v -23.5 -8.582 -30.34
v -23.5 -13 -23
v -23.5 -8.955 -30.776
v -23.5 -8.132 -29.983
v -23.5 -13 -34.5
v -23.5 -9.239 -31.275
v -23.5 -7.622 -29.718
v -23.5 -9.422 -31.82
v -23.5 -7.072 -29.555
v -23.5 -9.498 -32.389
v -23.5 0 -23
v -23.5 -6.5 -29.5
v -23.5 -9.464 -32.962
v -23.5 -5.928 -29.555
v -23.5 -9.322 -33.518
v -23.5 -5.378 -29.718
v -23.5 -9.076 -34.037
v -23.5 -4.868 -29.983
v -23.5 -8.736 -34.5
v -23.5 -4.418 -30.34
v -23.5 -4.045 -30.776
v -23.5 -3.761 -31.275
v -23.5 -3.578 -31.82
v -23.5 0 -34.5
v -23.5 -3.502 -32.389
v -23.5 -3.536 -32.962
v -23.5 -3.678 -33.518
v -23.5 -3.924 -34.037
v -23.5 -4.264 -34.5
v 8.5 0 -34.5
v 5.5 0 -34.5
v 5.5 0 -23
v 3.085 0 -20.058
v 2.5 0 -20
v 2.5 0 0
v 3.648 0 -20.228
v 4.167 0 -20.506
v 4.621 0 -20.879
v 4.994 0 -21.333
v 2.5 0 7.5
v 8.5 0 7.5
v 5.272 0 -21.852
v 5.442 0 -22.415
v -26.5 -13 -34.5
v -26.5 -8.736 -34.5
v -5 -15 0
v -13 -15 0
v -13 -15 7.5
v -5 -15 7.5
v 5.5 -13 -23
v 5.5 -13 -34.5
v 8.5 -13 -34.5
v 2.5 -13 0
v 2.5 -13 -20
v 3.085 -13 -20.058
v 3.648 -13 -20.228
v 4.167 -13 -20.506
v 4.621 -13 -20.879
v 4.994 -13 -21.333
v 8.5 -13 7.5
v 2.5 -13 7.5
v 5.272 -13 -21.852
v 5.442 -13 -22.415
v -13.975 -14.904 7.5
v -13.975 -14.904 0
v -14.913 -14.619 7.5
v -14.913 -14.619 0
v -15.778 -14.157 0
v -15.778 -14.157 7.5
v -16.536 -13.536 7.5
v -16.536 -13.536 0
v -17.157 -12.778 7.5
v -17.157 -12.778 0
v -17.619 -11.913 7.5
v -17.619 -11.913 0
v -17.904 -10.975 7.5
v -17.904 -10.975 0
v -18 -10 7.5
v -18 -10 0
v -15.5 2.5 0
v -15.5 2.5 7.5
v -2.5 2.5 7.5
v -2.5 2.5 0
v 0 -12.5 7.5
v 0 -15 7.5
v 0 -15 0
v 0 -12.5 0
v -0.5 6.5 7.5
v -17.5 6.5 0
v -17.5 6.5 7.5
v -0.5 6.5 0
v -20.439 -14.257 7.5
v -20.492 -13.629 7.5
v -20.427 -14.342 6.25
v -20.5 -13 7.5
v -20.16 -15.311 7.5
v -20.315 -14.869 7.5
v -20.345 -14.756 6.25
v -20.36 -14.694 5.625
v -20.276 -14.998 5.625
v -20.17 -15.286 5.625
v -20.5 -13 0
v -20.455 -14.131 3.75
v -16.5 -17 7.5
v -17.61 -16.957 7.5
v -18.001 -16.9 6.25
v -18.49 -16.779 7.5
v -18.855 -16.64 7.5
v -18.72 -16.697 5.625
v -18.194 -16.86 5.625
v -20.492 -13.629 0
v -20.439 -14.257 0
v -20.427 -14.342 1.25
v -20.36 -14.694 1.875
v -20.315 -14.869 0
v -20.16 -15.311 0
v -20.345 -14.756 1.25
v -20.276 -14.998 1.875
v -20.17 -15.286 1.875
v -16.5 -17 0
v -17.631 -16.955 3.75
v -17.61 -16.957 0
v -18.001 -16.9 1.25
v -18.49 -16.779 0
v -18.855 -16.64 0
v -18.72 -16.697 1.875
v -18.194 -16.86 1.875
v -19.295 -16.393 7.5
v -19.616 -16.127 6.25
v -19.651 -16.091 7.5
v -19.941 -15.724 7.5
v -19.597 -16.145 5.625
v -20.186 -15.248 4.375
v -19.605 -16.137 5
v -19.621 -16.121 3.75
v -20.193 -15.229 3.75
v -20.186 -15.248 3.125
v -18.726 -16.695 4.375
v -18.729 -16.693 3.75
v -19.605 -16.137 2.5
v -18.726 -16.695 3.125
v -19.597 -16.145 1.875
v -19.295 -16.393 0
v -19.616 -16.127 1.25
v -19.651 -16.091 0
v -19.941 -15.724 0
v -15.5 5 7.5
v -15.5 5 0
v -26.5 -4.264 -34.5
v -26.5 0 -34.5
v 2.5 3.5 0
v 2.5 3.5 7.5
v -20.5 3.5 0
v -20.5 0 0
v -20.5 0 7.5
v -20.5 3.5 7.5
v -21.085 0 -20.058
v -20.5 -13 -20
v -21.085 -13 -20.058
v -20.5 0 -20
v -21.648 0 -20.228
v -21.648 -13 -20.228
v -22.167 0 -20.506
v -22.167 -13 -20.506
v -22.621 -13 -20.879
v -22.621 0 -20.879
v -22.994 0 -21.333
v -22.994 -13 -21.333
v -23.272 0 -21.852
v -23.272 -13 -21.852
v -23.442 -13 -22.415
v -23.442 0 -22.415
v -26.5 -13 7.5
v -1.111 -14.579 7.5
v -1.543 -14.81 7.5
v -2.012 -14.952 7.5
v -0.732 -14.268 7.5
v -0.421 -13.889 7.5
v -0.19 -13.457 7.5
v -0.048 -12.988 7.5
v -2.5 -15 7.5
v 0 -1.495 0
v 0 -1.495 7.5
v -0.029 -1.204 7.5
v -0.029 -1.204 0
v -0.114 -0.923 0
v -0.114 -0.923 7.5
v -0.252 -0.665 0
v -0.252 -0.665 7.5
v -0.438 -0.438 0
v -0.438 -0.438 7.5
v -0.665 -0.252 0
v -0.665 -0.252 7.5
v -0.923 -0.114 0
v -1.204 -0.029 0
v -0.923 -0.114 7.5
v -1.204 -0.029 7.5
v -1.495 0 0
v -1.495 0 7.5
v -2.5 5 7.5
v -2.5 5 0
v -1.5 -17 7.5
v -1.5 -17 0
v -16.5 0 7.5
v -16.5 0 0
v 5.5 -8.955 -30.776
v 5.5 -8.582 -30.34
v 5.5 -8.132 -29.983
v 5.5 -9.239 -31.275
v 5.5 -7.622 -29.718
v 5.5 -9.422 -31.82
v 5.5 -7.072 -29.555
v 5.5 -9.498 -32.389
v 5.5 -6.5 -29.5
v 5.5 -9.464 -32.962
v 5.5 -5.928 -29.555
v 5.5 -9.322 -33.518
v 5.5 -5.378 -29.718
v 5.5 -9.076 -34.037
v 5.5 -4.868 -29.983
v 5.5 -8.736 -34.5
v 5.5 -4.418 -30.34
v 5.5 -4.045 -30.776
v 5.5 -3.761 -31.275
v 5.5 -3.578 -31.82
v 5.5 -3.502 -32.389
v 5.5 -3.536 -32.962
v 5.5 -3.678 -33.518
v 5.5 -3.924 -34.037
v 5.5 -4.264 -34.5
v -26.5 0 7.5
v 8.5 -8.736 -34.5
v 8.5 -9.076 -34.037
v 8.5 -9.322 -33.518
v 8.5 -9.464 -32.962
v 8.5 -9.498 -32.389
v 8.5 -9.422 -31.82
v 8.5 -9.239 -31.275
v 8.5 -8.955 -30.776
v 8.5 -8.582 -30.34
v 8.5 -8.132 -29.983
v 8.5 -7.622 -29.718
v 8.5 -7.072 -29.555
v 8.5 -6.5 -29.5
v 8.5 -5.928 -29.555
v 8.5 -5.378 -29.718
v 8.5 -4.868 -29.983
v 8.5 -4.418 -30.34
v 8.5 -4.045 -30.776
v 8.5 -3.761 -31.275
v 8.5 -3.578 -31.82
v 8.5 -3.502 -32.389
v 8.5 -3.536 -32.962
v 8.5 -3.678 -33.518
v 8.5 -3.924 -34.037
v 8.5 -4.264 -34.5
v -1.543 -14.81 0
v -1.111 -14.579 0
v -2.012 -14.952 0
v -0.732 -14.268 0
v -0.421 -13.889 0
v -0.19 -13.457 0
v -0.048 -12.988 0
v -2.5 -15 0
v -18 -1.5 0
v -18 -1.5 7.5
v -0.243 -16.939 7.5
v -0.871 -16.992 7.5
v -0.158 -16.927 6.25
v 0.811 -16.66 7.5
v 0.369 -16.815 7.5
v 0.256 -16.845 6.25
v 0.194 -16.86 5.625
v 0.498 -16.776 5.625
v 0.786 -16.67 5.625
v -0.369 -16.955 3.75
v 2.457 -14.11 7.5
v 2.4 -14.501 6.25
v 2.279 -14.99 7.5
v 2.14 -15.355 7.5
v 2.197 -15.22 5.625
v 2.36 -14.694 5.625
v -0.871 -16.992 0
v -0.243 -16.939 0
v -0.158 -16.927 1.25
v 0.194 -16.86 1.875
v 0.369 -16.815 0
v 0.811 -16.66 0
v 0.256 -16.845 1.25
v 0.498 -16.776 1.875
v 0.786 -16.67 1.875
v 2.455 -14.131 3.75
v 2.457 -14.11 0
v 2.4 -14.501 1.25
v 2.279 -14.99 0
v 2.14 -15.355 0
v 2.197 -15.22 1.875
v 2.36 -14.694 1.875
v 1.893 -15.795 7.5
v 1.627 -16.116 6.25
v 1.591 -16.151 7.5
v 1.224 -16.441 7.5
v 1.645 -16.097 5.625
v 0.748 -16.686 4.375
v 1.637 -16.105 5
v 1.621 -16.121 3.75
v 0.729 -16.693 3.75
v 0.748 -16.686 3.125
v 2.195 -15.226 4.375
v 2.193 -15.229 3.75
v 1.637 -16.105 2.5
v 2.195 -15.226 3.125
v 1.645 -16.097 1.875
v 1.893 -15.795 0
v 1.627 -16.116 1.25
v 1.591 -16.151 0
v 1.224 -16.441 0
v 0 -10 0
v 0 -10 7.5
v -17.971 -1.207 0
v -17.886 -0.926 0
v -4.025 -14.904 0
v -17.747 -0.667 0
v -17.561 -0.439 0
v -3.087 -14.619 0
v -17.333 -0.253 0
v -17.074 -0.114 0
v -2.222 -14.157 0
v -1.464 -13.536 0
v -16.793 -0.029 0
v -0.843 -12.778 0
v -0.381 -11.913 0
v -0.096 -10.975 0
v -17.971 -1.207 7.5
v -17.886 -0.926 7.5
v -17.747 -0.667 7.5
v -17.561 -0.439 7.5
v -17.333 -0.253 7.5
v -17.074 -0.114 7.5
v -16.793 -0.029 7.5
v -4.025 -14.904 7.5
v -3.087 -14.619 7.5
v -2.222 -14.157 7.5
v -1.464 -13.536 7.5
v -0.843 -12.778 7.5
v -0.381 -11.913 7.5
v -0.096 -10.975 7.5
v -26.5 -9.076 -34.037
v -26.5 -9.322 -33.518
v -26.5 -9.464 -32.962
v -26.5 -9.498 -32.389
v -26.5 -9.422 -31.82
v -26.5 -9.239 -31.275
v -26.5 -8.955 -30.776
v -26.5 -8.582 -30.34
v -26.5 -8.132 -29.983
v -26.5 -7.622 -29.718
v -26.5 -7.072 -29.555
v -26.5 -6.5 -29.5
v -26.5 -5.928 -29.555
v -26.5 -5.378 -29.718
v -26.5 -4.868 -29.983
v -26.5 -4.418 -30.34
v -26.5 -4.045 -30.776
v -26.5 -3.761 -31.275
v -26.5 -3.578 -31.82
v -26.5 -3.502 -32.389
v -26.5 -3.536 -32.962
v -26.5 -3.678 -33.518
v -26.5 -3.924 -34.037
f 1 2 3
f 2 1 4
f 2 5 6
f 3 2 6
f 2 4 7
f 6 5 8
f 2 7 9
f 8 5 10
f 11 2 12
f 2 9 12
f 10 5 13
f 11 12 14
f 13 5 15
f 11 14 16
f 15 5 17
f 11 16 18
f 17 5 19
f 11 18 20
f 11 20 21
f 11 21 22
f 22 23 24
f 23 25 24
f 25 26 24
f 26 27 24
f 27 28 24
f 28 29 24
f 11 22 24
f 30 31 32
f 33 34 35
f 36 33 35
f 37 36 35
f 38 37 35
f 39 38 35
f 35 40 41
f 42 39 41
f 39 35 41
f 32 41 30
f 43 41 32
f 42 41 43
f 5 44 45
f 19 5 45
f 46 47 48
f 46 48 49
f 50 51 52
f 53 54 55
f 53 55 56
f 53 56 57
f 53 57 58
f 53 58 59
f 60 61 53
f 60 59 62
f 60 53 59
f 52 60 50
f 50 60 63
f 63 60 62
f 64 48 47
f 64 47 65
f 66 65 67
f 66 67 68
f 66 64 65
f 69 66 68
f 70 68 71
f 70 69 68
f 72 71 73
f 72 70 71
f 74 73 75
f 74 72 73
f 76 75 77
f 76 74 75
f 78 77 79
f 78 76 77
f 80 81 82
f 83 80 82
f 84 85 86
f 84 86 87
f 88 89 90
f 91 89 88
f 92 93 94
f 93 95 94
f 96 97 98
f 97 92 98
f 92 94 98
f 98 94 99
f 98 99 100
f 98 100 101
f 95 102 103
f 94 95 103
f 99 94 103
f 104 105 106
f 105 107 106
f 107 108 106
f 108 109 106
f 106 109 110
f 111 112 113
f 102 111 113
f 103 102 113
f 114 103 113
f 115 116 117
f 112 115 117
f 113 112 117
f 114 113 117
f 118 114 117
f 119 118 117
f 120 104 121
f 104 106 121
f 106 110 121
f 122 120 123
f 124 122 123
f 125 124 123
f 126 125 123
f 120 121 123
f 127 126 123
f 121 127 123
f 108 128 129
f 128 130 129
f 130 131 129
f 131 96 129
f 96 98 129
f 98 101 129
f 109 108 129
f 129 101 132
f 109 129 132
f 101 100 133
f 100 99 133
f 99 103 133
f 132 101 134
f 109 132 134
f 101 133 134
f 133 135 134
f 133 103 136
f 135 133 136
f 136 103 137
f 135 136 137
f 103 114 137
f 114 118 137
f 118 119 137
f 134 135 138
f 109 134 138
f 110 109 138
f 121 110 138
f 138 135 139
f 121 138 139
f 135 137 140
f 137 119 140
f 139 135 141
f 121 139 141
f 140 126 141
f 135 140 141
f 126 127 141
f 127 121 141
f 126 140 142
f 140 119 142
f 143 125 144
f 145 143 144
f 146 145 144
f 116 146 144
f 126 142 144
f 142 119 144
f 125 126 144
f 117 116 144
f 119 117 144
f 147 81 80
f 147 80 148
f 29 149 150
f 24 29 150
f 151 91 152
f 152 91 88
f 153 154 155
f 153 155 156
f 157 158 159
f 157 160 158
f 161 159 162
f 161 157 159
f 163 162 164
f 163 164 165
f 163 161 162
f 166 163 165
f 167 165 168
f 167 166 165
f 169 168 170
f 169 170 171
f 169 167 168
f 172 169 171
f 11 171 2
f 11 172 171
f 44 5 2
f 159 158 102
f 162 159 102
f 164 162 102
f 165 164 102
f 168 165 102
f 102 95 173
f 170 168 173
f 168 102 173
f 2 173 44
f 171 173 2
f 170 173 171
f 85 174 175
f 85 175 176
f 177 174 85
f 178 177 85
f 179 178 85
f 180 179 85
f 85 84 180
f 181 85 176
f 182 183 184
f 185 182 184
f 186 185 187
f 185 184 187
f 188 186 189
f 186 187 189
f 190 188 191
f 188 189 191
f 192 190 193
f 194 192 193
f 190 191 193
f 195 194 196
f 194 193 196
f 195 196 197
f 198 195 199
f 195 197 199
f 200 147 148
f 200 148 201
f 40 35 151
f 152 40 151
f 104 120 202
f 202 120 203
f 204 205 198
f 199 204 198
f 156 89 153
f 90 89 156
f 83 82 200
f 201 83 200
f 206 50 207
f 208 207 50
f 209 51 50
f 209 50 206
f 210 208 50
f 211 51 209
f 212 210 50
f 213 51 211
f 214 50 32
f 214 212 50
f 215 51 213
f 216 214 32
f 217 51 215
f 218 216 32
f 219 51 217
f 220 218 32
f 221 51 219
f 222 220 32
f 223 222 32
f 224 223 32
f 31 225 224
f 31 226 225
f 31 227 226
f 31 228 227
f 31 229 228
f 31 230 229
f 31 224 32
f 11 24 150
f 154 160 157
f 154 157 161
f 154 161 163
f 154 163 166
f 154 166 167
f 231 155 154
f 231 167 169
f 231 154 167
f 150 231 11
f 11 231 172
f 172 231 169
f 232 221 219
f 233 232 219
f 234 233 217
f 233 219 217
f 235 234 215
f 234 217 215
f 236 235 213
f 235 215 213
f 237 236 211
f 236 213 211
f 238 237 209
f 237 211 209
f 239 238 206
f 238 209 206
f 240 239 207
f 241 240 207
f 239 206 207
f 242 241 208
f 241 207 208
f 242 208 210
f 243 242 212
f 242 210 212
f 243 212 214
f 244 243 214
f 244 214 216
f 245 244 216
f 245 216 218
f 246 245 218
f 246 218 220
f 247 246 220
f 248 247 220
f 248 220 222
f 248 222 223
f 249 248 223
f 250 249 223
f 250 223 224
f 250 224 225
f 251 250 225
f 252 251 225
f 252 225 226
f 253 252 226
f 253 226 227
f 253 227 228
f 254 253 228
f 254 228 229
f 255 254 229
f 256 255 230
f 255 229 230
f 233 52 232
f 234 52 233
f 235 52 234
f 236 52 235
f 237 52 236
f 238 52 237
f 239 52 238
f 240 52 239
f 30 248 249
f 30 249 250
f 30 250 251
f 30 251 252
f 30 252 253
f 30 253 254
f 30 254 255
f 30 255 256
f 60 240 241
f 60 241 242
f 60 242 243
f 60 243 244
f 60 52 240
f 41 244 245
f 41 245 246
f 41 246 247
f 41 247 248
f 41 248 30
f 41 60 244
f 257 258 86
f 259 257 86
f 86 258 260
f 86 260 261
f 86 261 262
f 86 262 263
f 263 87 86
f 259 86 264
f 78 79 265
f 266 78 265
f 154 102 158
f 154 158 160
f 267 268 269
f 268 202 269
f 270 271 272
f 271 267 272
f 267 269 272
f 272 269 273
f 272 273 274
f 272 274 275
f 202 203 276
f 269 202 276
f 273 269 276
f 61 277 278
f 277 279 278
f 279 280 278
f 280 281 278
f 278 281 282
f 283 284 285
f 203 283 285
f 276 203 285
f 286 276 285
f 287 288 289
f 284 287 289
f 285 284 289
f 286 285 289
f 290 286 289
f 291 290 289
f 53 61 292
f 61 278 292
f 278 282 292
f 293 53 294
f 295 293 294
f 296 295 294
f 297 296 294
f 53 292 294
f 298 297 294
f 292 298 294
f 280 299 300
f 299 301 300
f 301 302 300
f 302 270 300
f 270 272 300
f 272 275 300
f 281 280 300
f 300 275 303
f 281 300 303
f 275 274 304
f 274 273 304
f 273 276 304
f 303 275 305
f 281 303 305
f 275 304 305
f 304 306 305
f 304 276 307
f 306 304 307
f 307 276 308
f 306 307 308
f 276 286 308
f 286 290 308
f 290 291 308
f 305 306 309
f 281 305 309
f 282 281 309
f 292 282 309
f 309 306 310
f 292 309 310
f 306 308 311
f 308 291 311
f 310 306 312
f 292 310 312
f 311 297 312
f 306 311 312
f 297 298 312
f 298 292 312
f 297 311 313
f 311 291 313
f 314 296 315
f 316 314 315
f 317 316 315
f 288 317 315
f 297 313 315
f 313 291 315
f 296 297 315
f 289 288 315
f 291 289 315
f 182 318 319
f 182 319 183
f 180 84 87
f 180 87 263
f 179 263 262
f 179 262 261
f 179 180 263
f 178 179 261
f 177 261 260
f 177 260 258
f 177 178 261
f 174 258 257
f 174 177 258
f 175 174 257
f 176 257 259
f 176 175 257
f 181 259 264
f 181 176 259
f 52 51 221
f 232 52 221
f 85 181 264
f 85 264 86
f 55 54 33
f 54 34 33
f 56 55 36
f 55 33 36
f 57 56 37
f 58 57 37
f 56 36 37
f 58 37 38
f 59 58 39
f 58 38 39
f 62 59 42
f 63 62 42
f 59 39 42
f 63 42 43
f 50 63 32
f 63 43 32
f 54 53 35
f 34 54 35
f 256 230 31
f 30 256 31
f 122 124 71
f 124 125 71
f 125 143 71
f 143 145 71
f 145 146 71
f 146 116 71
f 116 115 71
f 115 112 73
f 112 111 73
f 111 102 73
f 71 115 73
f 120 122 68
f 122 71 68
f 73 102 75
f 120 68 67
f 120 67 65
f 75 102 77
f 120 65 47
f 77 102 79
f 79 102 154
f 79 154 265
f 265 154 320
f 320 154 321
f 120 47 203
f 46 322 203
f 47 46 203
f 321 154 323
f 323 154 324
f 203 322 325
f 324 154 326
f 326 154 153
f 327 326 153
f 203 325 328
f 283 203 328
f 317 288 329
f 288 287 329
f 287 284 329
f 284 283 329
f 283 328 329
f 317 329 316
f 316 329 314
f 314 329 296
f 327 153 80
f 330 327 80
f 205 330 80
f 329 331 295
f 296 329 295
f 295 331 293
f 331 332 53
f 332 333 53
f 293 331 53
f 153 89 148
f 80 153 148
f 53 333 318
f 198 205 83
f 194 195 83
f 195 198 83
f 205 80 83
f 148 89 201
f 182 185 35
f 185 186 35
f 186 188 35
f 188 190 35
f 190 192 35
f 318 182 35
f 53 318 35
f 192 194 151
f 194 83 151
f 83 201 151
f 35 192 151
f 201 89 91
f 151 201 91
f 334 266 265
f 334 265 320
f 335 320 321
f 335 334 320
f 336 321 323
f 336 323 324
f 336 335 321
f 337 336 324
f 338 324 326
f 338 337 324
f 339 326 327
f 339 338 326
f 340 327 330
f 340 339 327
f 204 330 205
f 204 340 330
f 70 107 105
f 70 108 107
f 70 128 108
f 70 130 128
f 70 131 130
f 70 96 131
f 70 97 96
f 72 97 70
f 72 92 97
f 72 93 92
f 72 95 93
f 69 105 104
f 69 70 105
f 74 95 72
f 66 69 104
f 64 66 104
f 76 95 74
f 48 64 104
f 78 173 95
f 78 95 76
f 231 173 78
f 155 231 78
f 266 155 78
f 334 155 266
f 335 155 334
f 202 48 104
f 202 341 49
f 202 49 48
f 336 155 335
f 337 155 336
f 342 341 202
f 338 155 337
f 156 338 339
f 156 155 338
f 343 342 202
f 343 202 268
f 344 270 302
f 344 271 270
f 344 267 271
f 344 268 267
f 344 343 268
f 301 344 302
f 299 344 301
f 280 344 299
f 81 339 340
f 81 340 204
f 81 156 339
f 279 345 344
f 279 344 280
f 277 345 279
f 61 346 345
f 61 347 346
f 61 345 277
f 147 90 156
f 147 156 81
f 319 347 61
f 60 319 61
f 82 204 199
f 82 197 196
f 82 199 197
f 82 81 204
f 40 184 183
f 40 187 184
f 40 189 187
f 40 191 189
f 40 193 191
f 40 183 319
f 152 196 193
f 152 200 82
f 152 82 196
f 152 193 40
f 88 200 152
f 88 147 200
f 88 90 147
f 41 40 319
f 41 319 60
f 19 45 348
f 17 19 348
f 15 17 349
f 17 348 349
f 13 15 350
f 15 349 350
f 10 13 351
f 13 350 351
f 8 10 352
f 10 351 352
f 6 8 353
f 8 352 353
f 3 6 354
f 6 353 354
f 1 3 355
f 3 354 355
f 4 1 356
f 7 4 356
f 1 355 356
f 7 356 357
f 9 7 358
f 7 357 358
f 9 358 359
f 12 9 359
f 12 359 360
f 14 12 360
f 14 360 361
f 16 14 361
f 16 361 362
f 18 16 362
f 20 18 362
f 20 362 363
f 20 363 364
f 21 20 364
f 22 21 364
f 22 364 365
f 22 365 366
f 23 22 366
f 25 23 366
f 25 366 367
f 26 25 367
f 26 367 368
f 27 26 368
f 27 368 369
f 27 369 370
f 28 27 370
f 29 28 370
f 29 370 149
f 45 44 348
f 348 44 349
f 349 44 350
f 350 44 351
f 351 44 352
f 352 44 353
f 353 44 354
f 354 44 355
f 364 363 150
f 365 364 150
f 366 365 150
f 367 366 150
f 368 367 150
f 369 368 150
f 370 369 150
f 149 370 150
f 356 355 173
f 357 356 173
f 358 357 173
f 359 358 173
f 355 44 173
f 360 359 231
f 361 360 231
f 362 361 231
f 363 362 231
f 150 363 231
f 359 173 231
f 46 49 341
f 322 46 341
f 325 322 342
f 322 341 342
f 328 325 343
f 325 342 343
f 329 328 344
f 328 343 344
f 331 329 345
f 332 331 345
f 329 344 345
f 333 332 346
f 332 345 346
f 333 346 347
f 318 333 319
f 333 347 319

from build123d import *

# Parameters (mm, degrees)
SKETCH1_W            = 23
SKETCH1_H            = 23.5
SKETCH1_W_2          = 18
SKETCH1_H_2          = 15
BOSS_EXTRUDE1_DEPTH  = 7.5
FILLET1_SIZE         = 4
BOSS_EXTRUDE2_DEPTH  = 7.5
BOSS_EXTRUDE3_DEPTH  = 7.5
BOSS_EXTRUDE4_DEPTH  = 7.5
BOSS_EXTRUDE11_DEPTH = 7.5
CHAMFER1_SIZE        = 3
SKETCH8_W            = 13
SKETCH8_H            = 2.5
CUT_EXTRUDE1_DEPTH   = 7.5
BOSS_EXTRUDE12_START = -7.5
SKETCH9_W            = 6
SKETCH9_H            = 13
BOSS_EXTRUDE12_DEPTH = 52.5
SKETCH11_W           = 3
SKETCH11_H           = 13
CUT_EXTRUDE3_DEPTH   = 25
FILLET3_R            = 3
FILLET3_OF_MIRROR7_R = 3
SKETCH12_R           = 3
SKETCH12_W           = 10.5
SKETCH12_H           = 13
CUT_EXTRUDE4_DEPTH   = 60.489494958


# Some blends are built 0.0001 mm under size
with BuildPart() as part:
    # Sketch1 → Boss-Extrude1 (new body)
    with BuildSketch(Plane.XY):
        with Locations((-9, -5.25)):
            Rectangle(SKETCH1_W, SKETCH1_H)
        with Locations((-9, -7.5)):
            Rectangle(SKETCH1_W_2, SKETCH1_H_2, mode=Mode.SUBTRACT)
    extrude(amount=BOSS_EXTRUDE1_DEPTH)

    # Fillet1
    # a fillet whose section is not a circle: 4 mm, written as the material it takes off along each edge
    with BuildSketch(Plane(origin=(-20.5, -17, -10), x_dir=(0, 1, 0), z_dir=(0, 0, 1)), Plane(origin=(2.5, -17, -10), x_dir=(-1, 0, 0), z_dir=(0, 0, 1))) as fillet1_piece_1:
        with BuildLine():
            add(Edge.make_bspline([(FILLET1_SIZE, 0), (FILLET1_SIZE * 0.831801948466, 0), (FILLET1_SIZE * 0.663603896932, 0), (FILLET1_SIZE * 0.292893218813, -FILLET1_SIZE * 0.0716919198361), (FILLET1_SIZE * 0.0716919198361, -FILLET1_SIZE * 0.292893218813), (0, -FILLET1_SIZE * 0.663603896932), (0, -FILLET1_SIZE * 0.831801948466), (0, -FILLET1_SIZE)], knots=[0, 0, 0, 0, 0, 0, 0.5, 0.5, 1, 1, 1, 1, 1, 1], degree=5))
            Line((0, -FILLET1_SIZE), (0, 0))
            Line((0, 0), (FILLET1_SIZE, 0))
        make_face()
    extrude(amount=27.5, mode=Mode.SUBTRACT)

    # Sketch3 → Boss-Extrude2 (add)
    with BuildSketch(Plane.XY.offset(7.5)):
        with BuildLine():
            Line((-16.5, 0), (-18, 0))
            Line((-18, 0), (-18, -1.5))
            ThreePointArc((-18, -1.5), (-17.560660172, -0.439339828), (-16.5, 0))
        make_face()
    extrude(amount=-BOSS_EXTRUDE2_DEPTH)

    # Sketch4 → Boss-Extrude3 (add)
    with BuildSketch(Plane.XY.offset(7.5)):
        with BuildLine():
            Line((0, 0), (0, -1.495394009))
            ThreePointArc((0, -1.495394009), (-0.437990765, -0.437990765), (-1.495394009, 0))
            Line((-1.495394009, 0), (0, 0))
        make_face()
    extrude(amount=-BOSS_EXTRUDE3_DEPTH)

    # Sketch7 → Boss-Extrude11 (add)
    with BuildSketch(Plane.XY.offset(7.5)):
        with BuildLine():
            Line((-18, -15), (-13, -15))
            ThreePointArc((-13, -15), (-16.535533906, -13.535533906), (-18, -10))
            Line((-18, -10), (-18, -15))
        make_face()
        with BuildLine():
            Line((0, -15), (-5, -15))
            ThreePointArc((-5, -15), (-1.464466094, -13.535533906), (0, -10))
            Line((0, -10), (0, -15))
        make_face()
    extrude(amount=-BOSS_EXTRUDE11_DEPTH)

    # Chamfer1
    chamfer1_edges = [part.edges().sort_by_distance(p)[0] for p in [
        (2.5, 6.5, 3.75),
        (-20.5, 6.5, 3.75),
    ]]
    chamfer(chamfer1_edges, length=CHAMFER1_SIZE)

    # Sketch8 → Cut-Extrude1 (cut)
    with BuildSketch(Plane.XY.offset(7.5)):
        with Locations((-9, 3.75)):
            Rectangle(SKETCH8_W, SKETCH8_H)
    extrude(amount=-CUT_EXTRUDE1_DEPTH, mode=Mode.SUBTRACT)

    # Sketch9 → Boss-Extrude12 (add)
    with BuildSketch(Plane(origin=(0, 0, 0), x_dir=(-1, 0, 0), z_dir=(0, 0, -1)).offset(BOSS_EXTRUDE12_START)):
        with Locations((23.5, -6.5)):
            Rectangle(SKETCH9_W, SKETCH9_H)
    boss_extrude12 = extrude(amount=BOSS_EXTRUDE12_DEPTH)

    # Sketch11 → Cut-Extrude3 (cut)
    with BuildSketch(Plane(origin=(0, 0, -45), x_dir=(-1, 0, 0), z_dir=(0, 0, -1))):
        with Locations((22, -6.5)):
            Rectangle(SKETCH11_W, SKETCH11_H)
    cut_extrude3 = extrude(amount=-CUT_EXTRUDE3_DEPTH, mode=Mode.SUBTRACT)

    # Fillet3
    fillet3_edges = [part.edges().sort_by_distance(p)[0] for p in [
        (-23.5, -6.5, -20),
    ]]
    fillet(fillet3_edges, radius=FILLET3_R - 0.0001)  # a hair under: the kernel refuses the full size

    # Mirror7: Boss-Extrude12, Cut-Extrude3 across plane
    add(boss_extrude12.mirror(Plane.ZY.offset(9)))
    add(cut_extrude3.mirror(Plane.ZY.offset(9)), mode=Mode.SUBTRACT)

    # Fillet3 of Mirror7
    fillet3_of_mirror7_edges = [part.edges().sort_by_distance(p)[0] for p in [
        (5.5, -6.5, -20),
    ]]
    fillet(fillet3_of_mirror7_edges, radius=FILLET3_OF_MIRROR7_R - 0.0001)  # a hair under: the kernel refuses the full size

    # Sketch12 → Cut-Extrude4 (cut, through all)
    with BuildSketch(Plane.ZY.offset(26.5)):
        with Locations((-32.5, -6.5)):
            Circle(SKETCH12_R)
        with Locations((-39.75, -6.5)):
            Rectangle(SKETCH12_W, SKETCH12_H)
    extrude(amount=-CUT_EXTRUDE4_DEPTH, mode=Mode.SUBTRACT)


with BuildPart() as body_2:
    # Sketch6 → Boss-Extrude4 (new body)
    with BuildSketch(Plane.XY.offset(7.5)):
        with BuildLine():
            Line((0, -15), (0, -12.5))
            ThreePointArc((0, -12.5), (-0.732233047, -14.267766953), (-2.5, -15))
            Line((-2.5, -15), (0, -15))
        make_face()
    extrude(amount=-BOSS_EXTRUDE4_DEPTH)


solid = Compound([part.part, body_2.part])
